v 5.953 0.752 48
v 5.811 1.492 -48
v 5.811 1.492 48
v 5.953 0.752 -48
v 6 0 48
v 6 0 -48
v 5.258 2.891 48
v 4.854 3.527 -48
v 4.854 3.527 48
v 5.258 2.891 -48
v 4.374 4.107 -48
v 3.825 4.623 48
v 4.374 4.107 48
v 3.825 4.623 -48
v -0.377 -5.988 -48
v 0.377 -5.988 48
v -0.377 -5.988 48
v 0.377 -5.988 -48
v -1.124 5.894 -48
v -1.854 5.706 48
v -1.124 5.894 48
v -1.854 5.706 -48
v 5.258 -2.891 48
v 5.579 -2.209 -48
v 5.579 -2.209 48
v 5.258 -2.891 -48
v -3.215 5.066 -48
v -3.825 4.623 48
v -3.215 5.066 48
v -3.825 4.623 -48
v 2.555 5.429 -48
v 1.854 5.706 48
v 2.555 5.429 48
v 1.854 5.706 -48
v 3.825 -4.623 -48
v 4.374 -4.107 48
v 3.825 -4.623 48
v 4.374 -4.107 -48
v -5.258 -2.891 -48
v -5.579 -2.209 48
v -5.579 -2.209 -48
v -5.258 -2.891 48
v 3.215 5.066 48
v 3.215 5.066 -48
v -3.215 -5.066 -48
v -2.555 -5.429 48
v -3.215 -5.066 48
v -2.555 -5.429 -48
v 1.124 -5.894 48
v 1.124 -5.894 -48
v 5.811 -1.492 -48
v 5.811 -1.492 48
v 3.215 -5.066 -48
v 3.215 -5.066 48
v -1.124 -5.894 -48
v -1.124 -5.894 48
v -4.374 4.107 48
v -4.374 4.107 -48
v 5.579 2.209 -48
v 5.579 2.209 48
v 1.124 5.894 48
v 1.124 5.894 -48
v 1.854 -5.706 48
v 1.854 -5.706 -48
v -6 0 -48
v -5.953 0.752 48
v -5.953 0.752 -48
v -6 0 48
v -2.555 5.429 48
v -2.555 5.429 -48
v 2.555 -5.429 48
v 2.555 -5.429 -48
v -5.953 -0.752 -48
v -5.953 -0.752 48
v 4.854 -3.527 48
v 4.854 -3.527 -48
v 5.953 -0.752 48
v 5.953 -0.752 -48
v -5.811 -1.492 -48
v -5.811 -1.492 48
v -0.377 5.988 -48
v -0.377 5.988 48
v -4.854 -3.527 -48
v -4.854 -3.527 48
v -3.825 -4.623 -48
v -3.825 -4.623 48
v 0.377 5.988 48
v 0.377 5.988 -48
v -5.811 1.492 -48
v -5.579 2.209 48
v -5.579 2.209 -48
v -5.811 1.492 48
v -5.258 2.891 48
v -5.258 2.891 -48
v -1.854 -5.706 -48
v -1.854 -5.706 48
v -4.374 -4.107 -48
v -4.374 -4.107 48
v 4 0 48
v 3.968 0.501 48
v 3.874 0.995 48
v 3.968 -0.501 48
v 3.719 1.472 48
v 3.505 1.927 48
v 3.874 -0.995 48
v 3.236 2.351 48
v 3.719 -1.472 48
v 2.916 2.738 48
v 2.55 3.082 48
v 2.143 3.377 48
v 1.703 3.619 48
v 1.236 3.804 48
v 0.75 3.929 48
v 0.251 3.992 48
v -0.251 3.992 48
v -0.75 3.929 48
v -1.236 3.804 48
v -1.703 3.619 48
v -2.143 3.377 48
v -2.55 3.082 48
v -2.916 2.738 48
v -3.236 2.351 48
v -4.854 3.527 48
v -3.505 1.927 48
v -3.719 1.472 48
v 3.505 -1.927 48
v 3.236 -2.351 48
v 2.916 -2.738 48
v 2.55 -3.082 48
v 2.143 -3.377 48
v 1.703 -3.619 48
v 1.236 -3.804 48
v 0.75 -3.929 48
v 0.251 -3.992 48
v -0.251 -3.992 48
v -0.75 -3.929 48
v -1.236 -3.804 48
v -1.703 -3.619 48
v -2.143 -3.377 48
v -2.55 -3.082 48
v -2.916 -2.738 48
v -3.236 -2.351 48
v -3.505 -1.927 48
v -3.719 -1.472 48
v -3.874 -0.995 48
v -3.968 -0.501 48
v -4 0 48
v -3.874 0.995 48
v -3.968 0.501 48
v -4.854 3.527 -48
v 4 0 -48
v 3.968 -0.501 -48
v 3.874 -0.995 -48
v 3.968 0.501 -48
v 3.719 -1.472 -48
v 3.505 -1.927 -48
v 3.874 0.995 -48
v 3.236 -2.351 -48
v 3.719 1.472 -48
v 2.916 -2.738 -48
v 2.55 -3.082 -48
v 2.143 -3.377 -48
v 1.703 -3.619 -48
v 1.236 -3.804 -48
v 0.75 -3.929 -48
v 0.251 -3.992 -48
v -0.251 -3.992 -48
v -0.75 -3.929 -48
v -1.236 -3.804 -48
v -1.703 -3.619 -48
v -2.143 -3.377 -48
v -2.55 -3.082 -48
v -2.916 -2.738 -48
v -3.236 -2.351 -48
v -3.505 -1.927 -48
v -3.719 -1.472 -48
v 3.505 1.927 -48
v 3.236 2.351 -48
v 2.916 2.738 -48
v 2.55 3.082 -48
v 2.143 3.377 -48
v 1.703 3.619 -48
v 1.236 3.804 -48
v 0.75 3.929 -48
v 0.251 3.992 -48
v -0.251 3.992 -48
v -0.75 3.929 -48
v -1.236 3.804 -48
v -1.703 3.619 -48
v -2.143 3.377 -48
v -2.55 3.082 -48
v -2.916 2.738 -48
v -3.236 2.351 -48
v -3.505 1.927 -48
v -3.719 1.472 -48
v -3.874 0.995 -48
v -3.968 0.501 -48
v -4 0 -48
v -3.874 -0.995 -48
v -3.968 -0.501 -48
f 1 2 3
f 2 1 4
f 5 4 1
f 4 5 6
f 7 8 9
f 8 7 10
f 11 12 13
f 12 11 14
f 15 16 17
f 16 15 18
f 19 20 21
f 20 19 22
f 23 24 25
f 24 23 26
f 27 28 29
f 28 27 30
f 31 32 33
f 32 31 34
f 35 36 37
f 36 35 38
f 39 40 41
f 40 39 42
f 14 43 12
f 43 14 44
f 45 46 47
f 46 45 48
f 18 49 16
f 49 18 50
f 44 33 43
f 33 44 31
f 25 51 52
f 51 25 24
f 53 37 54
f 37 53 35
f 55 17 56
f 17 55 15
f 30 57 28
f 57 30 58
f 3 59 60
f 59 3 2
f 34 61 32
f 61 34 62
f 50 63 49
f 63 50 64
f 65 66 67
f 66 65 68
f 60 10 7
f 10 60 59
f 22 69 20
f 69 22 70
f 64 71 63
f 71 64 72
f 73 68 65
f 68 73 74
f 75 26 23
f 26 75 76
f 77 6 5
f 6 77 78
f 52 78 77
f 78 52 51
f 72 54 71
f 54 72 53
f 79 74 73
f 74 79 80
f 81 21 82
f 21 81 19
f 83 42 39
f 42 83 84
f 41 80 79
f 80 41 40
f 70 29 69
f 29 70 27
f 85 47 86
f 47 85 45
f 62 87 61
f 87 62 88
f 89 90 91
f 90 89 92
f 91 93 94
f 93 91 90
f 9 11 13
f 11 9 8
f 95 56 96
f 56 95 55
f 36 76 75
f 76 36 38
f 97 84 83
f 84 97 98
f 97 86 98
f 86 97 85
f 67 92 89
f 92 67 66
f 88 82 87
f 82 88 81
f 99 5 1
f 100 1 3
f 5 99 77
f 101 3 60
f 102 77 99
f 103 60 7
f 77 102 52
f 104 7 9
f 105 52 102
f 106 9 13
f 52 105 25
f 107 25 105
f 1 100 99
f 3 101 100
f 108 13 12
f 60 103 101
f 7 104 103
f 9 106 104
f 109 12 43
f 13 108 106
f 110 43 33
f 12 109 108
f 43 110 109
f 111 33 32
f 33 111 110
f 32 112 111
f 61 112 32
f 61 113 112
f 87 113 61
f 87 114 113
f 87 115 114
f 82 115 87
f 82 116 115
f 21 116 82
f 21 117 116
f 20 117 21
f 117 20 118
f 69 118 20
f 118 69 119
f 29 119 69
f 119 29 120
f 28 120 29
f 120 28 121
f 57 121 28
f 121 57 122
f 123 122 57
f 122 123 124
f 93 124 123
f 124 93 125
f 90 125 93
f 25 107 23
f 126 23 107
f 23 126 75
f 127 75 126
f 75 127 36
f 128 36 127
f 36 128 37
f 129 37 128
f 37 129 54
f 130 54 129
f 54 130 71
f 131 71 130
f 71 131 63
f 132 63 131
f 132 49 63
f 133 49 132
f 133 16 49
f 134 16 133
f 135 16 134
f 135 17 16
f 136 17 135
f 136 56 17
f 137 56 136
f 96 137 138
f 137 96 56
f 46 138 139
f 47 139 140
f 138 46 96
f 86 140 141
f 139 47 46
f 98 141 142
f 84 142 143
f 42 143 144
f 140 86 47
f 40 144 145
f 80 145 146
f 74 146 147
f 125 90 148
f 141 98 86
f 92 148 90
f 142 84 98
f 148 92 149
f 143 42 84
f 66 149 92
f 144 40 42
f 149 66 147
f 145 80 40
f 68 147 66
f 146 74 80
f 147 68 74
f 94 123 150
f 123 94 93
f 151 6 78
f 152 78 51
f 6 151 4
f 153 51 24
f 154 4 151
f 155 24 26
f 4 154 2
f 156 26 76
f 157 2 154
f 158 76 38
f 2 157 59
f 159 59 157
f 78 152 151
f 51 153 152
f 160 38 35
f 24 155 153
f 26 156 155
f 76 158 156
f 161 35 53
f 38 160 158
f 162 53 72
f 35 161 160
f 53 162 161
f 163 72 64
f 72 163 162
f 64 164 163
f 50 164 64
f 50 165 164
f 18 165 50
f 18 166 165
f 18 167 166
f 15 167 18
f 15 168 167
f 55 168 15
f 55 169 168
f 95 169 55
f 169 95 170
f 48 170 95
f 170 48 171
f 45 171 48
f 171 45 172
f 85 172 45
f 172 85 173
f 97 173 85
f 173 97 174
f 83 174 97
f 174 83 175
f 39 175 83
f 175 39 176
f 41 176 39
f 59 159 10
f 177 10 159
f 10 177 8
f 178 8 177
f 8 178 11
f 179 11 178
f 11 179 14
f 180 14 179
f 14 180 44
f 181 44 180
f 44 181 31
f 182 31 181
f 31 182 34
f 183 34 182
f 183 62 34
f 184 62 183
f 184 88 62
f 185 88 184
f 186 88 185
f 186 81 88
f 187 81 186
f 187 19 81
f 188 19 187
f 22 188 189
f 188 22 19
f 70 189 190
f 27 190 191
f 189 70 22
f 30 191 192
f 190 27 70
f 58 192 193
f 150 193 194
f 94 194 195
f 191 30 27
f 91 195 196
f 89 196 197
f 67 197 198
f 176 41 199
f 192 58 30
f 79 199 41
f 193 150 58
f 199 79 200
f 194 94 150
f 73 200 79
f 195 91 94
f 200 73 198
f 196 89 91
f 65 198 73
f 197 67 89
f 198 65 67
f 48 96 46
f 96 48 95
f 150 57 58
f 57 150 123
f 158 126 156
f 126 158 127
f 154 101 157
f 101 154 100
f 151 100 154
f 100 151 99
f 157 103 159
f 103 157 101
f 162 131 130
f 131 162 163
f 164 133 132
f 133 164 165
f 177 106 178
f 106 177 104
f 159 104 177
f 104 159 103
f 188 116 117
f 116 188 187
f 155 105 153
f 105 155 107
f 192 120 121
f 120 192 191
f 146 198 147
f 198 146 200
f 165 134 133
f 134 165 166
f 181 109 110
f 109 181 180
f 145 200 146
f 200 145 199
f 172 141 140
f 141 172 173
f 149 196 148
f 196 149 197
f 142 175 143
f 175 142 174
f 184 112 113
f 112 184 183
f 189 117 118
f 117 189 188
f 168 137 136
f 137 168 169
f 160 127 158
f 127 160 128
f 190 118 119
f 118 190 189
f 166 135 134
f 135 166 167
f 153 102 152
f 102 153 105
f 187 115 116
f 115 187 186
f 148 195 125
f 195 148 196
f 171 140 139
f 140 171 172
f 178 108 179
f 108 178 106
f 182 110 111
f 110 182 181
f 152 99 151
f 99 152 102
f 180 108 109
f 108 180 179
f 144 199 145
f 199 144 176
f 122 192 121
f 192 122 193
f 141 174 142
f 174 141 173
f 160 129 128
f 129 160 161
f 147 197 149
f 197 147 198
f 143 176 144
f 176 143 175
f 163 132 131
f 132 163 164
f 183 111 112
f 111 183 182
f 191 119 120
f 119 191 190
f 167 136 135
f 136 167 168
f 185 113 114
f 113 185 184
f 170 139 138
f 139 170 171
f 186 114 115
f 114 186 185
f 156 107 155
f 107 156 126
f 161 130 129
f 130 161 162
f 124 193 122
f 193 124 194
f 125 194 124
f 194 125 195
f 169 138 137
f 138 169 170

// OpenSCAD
$fn = 50;


difference() {
	union() {
		translate(v = [0, 0, -48.0000000000]) {
			cylinder(h = 96, r = 6.0000000000);
		}
	}
	union() {
		translate(v = [0, 0, -100.0000000000]) {
			cylinder(h = 200, r = 4.0000000000);
		}
	}
}
